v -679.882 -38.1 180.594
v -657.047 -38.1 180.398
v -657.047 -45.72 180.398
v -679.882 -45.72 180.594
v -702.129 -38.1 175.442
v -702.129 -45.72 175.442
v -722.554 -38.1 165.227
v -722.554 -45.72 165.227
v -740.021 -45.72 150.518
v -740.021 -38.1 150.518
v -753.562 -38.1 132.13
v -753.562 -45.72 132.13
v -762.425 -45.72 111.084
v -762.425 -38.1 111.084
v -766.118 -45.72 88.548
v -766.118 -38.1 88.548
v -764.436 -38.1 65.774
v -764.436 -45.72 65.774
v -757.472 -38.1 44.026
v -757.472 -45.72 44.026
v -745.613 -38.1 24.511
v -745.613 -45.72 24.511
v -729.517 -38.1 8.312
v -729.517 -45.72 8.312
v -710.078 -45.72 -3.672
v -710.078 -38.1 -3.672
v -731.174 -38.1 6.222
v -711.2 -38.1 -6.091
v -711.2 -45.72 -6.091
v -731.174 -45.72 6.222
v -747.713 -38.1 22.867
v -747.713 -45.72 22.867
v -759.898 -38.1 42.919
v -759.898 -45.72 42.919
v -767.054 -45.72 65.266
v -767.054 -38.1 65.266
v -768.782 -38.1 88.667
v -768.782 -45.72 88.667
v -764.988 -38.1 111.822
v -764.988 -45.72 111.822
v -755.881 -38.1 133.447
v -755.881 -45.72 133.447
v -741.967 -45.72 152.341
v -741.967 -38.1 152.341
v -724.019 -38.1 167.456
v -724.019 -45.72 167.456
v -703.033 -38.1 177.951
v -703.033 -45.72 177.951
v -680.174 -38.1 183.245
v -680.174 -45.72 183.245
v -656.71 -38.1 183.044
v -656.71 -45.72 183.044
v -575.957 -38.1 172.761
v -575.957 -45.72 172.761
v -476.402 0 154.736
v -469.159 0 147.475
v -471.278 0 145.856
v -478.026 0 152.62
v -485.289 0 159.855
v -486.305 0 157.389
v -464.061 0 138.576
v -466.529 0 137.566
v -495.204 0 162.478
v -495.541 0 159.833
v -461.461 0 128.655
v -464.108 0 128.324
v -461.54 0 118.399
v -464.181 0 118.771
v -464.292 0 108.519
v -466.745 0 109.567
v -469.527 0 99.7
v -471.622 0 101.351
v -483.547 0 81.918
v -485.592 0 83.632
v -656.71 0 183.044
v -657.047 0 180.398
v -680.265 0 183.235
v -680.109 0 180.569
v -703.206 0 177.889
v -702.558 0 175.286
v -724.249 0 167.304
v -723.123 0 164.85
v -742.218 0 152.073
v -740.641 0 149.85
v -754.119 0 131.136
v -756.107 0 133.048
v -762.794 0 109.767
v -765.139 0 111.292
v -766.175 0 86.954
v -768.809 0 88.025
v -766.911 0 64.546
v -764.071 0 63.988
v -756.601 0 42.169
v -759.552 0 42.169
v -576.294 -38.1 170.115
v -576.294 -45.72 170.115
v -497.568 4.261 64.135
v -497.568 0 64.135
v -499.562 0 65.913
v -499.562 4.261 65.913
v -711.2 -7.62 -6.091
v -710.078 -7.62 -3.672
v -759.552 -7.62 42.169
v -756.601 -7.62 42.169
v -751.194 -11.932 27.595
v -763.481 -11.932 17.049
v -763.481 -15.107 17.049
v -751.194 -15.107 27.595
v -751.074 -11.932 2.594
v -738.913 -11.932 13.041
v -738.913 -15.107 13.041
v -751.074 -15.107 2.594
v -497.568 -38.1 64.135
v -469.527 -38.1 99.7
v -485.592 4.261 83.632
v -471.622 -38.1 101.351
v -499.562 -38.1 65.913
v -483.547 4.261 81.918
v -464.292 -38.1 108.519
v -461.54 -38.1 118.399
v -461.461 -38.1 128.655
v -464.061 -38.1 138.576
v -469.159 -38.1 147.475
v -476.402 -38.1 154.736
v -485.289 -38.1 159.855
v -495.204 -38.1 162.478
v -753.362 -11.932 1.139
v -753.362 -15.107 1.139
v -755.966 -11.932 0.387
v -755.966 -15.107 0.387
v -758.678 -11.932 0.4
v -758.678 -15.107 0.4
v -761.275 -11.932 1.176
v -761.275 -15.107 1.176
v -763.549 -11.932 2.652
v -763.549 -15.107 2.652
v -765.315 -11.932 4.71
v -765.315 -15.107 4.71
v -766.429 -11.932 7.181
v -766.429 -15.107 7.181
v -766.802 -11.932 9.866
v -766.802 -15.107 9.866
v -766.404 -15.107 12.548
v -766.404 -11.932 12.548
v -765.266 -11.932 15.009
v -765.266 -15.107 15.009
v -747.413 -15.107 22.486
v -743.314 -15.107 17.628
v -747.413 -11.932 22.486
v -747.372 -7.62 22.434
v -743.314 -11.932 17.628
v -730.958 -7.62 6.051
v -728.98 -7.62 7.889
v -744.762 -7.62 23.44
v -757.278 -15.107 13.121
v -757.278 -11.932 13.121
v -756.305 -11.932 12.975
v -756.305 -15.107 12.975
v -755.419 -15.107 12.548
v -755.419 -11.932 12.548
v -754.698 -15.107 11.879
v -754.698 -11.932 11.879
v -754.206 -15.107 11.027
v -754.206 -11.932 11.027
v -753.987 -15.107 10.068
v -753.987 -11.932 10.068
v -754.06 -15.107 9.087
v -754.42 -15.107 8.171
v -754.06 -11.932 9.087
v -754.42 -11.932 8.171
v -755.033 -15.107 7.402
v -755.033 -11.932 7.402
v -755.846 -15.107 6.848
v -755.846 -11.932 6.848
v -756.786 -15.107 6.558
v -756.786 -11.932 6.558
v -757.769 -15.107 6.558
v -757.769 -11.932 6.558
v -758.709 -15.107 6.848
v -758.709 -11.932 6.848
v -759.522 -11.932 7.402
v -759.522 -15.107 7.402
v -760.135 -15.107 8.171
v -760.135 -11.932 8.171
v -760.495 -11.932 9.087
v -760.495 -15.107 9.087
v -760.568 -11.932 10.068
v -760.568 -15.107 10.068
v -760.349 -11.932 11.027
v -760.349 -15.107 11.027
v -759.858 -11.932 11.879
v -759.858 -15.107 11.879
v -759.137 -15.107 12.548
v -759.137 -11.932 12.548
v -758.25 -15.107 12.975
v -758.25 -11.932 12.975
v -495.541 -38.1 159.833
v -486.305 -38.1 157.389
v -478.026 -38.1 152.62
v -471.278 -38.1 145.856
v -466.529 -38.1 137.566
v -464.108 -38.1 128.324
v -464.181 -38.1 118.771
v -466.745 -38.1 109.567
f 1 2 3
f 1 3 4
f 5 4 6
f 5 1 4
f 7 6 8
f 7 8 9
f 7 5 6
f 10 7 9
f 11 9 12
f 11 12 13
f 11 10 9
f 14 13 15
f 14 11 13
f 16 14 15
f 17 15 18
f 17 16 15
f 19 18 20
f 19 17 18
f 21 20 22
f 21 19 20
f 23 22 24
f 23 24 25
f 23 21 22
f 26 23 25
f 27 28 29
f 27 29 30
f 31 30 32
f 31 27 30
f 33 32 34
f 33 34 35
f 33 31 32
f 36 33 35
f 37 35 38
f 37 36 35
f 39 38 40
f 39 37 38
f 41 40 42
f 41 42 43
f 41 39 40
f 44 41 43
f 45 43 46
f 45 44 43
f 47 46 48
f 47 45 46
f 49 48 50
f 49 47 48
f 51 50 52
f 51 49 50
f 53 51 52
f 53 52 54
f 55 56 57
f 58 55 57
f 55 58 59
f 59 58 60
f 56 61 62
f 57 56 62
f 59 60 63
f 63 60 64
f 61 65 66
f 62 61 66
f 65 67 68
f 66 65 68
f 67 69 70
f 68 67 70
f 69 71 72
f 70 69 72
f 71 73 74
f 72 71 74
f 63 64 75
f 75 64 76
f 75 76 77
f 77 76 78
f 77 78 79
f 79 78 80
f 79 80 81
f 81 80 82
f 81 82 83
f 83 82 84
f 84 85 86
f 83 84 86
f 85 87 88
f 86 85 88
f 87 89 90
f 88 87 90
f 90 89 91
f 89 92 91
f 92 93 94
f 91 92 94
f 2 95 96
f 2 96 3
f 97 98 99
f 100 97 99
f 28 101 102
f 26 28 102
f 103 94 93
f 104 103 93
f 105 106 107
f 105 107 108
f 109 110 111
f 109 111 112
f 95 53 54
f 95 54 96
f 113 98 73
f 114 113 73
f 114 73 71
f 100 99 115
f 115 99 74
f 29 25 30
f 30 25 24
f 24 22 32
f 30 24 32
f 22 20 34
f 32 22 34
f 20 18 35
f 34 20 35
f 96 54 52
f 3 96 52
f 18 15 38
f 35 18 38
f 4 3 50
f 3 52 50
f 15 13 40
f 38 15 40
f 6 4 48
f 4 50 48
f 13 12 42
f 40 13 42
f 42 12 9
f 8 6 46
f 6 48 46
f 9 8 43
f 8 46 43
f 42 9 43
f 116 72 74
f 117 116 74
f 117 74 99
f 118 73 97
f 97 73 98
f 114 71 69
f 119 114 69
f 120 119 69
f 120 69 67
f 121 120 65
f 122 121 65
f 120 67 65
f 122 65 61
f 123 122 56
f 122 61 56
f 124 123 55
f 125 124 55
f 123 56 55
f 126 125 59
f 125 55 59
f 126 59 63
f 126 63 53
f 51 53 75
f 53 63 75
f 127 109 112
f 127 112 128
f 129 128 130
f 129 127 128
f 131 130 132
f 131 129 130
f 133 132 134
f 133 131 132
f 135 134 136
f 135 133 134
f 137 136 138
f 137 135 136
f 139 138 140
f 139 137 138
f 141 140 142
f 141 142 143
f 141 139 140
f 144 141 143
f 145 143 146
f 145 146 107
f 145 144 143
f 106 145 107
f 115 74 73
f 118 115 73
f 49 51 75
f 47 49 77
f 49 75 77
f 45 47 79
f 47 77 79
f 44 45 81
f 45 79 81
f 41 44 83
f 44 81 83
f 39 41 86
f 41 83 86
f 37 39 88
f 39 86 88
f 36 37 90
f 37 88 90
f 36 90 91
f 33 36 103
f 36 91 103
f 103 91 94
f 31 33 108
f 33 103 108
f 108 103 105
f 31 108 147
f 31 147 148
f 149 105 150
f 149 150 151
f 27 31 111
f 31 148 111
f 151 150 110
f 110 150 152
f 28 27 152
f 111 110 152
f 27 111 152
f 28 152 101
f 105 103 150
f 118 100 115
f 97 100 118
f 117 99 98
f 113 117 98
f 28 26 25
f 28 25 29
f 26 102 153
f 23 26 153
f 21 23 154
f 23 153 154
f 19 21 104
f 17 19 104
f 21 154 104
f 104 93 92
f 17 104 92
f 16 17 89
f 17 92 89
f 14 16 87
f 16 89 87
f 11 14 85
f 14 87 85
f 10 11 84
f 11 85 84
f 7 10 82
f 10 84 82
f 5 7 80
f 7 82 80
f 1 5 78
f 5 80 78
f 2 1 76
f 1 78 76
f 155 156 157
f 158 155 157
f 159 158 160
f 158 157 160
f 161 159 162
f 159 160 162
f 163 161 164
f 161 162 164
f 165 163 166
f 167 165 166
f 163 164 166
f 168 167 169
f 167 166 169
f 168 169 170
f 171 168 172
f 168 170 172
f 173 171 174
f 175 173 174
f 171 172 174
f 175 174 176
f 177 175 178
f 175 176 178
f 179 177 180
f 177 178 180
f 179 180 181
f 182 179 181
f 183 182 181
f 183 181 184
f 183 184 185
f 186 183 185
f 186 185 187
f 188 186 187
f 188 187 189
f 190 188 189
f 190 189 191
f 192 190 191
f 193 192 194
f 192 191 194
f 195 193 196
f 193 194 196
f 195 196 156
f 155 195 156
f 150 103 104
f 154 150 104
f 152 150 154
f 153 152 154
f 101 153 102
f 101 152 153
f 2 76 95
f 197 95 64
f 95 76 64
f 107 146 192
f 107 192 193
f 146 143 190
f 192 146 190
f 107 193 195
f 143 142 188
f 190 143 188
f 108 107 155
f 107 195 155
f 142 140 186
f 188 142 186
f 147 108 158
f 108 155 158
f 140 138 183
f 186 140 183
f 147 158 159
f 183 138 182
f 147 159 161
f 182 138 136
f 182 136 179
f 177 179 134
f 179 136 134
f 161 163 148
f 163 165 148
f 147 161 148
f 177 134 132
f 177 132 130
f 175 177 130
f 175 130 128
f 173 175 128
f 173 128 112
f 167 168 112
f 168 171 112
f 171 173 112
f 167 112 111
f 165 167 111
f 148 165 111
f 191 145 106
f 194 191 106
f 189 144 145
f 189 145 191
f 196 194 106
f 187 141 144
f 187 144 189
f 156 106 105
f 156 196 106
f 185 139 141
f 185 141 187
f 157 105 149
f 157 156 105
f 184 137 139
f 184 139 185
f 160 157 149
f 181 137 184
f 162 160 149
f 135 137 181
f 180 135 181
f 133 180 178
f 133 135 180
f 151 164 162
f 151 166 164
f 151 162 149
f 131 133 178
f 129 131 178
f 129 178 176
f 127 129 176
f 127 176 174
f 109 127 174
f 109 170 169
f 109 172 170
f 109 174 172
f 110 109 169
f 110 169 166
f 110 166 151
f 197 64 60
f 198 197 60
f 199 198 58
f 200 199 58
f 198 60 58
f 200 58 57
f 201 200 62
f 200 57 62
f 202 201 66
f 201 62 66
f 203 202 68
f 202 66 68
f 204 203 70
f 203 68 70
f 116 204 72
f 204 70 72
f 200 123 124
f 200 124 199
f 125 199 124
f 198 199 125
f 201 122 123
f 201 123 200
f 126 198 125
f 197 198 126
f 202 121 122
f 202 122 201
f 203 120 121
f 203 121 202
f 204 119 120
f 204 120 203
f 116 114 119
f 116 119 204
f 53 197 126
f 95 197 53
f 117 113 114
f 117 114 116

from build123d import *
from build123d.topology import SkipClean

# Parameters (mm, degrees)
BASE_FLANGE1_DEPTH  = 38.1
CUT_EXTRUDE1_DEPTH  = 7.62
SKETCH9_R           = 3.3
BOSS_EXTRUDE1_DEPTH = 3.175
BOSS_EXTRUDE2_DEPTH = 7.62
BOSS_EXTRUDE4_DEPTH = 4.26074332


# Sheet-metal steps are written as plain solids
with BuildPart() as part:
    # Sketch1 → Base-Flange1 (new body)
    with BuildSketch(Plane(origin=(0, 0, 0), x_dir=(1, 0, 0), z_dir=(0, 1, 0))):
        with BuildLine():
            Line((-657.047015903, -180.398251424), (-495.540915967, -159.83264605))
            ThreePointArc((-495.540915967, -159.83264605), (-466.529161595, -137.56639807), (-471.621526187, -101.351269827))
            Line((-471.621526187, -101.351269827), (-499.562056453, -65.912999952))
            Line((-499.562056453, -65.912999952), (-497.56764915, -64.134999952))
            Line((-497.56764915, -64.134999952), (-469.527179345, -99.700027778))
            ThreePointArc((-469.527179345, -99.700027778), (-464.060656724, -138.576037958), (-495.204030033, -162.478283377))
            Line((-495.204030033, -162.478283377), (-656.710129969, -183.043888751))
            ThreePointArc((-656.710129969, -183.043888751), (-764.987734735, -111.822063922), (-711.2, 6.090902363))
            Line((-711.2, 6.090902363), (-710.077660148, 3.671554877))
            ThreePointArc((-710.077660148, 3.671554877), (-762.424972114, -111.083730158), (-657.047015903, -180.398251424))
        make_face()
    extrude(amount=-BASE_FLANGE1_DEPTH)

    # Sketch7 → Cut-Extrude1 (cut)
    with BuildSketch(Plane(origin=(-711.2, 0, -6.090902363), x_dir=(1, 0, 0), z_dir=(0, 1, 0))):
        with BuildLine():
            Line((1.122339852, -2.419347486), (0, 0))
            ThreePointArc((0, 0), (-28.443609249, -19.854342865), (-48.352212426, -48.26))
            Line((-48.352212426, -48.26), (-45.400744677, -48.26))
            ThreePointArc((-45.400744677, -48.26), (-26.116771828, -21.302890058), (1.122339852, -2.419347486))
        make_face()
    extrude(amount=-CUT_EXTRUDE1_DEPTH, mode=Mode.SUBTRACT)

    # Sketch9 → Boss-Extrude1 (add)
    with BuildSketch(Plane(origin=(0, -11.93175668, 0), x_dir=(1, 0, 0), z_dir=(0, 1, 0))):
        with BuildLine():
            ThreePointArc((-751.074016673, -2.593523568), (-764.50540437, -3.617766971), (-763.481160967, -17.049154667))
            Line((-763.481160967, -17.049154667), (-751.193944793, -27.595167013))
            ThreePointArc((-751.193944793, -27.595167013), (-745.401952839, -20.024035331), (-738.912633033, -13.041347154))
            Line((-738.912633033, -13.041347154), (-751.074016673, -2.593523568))
        make_face()
        with Locations(Location((-757.27758882, -9.821339117, 0), (0, 0, 270))):
            Circle(SKETCH9_R, mode=Mode.SUBTRACT)
    extrude(amount=-BOSS_EXTRUDE1_DEPTH)

    # Sketch10 → Boss-Extrude2 (add)
    with SkipClean():  # the faces are left unmerged after this step: merging them gives an invalid solid
        with BuildSketch(Plane.XZ.offset(38.1)):
            with BuildLine():
                Line((-710.077660148, -3.671554877), (-711.2, -6.090902363))
                ThreePointArc((-711.2, -6.090902363), (-764.987734735, 111.822063922), (-656.710129969, 183.043888751))
                Line((-656.710129969, 183.043888751), (-575.957080001, 172.761086064))
                Line((-575.957080001, 172.761086064), (-576.293965935, 170.115448737))
                Line((-576.293965935, 170.115448737), (-657.047015903, 180.398251424))
                ThreePointArc((-657.047015903, 180.398251424), (-762.424972114, 111.083730158), (-710.077660148, -3.671554877))
            make_face()
        extrude(amount=BOSS_EXTRUDE2_DEPTH)

    # Sketch12 → Boss-Extrude4 (add)
    with SkipClean():  # the faces are left unmerged after this step: merging them gives an invalid solid
        with BuildSketch(Plane(origin=(0, 0, 0), x_dir=(1, 0, 0), z_dir=(0, 1, 0))):
            Polygon((-497.56764915, -64.134999952), (-499.562056453, -65.912999952), (-485.59179132, -83.632134889), (-483.547414248, -81.917513865), align=None)
        extrude(amount=BOSS_EXTRUDE4_DEPTH)


solid = part.part
